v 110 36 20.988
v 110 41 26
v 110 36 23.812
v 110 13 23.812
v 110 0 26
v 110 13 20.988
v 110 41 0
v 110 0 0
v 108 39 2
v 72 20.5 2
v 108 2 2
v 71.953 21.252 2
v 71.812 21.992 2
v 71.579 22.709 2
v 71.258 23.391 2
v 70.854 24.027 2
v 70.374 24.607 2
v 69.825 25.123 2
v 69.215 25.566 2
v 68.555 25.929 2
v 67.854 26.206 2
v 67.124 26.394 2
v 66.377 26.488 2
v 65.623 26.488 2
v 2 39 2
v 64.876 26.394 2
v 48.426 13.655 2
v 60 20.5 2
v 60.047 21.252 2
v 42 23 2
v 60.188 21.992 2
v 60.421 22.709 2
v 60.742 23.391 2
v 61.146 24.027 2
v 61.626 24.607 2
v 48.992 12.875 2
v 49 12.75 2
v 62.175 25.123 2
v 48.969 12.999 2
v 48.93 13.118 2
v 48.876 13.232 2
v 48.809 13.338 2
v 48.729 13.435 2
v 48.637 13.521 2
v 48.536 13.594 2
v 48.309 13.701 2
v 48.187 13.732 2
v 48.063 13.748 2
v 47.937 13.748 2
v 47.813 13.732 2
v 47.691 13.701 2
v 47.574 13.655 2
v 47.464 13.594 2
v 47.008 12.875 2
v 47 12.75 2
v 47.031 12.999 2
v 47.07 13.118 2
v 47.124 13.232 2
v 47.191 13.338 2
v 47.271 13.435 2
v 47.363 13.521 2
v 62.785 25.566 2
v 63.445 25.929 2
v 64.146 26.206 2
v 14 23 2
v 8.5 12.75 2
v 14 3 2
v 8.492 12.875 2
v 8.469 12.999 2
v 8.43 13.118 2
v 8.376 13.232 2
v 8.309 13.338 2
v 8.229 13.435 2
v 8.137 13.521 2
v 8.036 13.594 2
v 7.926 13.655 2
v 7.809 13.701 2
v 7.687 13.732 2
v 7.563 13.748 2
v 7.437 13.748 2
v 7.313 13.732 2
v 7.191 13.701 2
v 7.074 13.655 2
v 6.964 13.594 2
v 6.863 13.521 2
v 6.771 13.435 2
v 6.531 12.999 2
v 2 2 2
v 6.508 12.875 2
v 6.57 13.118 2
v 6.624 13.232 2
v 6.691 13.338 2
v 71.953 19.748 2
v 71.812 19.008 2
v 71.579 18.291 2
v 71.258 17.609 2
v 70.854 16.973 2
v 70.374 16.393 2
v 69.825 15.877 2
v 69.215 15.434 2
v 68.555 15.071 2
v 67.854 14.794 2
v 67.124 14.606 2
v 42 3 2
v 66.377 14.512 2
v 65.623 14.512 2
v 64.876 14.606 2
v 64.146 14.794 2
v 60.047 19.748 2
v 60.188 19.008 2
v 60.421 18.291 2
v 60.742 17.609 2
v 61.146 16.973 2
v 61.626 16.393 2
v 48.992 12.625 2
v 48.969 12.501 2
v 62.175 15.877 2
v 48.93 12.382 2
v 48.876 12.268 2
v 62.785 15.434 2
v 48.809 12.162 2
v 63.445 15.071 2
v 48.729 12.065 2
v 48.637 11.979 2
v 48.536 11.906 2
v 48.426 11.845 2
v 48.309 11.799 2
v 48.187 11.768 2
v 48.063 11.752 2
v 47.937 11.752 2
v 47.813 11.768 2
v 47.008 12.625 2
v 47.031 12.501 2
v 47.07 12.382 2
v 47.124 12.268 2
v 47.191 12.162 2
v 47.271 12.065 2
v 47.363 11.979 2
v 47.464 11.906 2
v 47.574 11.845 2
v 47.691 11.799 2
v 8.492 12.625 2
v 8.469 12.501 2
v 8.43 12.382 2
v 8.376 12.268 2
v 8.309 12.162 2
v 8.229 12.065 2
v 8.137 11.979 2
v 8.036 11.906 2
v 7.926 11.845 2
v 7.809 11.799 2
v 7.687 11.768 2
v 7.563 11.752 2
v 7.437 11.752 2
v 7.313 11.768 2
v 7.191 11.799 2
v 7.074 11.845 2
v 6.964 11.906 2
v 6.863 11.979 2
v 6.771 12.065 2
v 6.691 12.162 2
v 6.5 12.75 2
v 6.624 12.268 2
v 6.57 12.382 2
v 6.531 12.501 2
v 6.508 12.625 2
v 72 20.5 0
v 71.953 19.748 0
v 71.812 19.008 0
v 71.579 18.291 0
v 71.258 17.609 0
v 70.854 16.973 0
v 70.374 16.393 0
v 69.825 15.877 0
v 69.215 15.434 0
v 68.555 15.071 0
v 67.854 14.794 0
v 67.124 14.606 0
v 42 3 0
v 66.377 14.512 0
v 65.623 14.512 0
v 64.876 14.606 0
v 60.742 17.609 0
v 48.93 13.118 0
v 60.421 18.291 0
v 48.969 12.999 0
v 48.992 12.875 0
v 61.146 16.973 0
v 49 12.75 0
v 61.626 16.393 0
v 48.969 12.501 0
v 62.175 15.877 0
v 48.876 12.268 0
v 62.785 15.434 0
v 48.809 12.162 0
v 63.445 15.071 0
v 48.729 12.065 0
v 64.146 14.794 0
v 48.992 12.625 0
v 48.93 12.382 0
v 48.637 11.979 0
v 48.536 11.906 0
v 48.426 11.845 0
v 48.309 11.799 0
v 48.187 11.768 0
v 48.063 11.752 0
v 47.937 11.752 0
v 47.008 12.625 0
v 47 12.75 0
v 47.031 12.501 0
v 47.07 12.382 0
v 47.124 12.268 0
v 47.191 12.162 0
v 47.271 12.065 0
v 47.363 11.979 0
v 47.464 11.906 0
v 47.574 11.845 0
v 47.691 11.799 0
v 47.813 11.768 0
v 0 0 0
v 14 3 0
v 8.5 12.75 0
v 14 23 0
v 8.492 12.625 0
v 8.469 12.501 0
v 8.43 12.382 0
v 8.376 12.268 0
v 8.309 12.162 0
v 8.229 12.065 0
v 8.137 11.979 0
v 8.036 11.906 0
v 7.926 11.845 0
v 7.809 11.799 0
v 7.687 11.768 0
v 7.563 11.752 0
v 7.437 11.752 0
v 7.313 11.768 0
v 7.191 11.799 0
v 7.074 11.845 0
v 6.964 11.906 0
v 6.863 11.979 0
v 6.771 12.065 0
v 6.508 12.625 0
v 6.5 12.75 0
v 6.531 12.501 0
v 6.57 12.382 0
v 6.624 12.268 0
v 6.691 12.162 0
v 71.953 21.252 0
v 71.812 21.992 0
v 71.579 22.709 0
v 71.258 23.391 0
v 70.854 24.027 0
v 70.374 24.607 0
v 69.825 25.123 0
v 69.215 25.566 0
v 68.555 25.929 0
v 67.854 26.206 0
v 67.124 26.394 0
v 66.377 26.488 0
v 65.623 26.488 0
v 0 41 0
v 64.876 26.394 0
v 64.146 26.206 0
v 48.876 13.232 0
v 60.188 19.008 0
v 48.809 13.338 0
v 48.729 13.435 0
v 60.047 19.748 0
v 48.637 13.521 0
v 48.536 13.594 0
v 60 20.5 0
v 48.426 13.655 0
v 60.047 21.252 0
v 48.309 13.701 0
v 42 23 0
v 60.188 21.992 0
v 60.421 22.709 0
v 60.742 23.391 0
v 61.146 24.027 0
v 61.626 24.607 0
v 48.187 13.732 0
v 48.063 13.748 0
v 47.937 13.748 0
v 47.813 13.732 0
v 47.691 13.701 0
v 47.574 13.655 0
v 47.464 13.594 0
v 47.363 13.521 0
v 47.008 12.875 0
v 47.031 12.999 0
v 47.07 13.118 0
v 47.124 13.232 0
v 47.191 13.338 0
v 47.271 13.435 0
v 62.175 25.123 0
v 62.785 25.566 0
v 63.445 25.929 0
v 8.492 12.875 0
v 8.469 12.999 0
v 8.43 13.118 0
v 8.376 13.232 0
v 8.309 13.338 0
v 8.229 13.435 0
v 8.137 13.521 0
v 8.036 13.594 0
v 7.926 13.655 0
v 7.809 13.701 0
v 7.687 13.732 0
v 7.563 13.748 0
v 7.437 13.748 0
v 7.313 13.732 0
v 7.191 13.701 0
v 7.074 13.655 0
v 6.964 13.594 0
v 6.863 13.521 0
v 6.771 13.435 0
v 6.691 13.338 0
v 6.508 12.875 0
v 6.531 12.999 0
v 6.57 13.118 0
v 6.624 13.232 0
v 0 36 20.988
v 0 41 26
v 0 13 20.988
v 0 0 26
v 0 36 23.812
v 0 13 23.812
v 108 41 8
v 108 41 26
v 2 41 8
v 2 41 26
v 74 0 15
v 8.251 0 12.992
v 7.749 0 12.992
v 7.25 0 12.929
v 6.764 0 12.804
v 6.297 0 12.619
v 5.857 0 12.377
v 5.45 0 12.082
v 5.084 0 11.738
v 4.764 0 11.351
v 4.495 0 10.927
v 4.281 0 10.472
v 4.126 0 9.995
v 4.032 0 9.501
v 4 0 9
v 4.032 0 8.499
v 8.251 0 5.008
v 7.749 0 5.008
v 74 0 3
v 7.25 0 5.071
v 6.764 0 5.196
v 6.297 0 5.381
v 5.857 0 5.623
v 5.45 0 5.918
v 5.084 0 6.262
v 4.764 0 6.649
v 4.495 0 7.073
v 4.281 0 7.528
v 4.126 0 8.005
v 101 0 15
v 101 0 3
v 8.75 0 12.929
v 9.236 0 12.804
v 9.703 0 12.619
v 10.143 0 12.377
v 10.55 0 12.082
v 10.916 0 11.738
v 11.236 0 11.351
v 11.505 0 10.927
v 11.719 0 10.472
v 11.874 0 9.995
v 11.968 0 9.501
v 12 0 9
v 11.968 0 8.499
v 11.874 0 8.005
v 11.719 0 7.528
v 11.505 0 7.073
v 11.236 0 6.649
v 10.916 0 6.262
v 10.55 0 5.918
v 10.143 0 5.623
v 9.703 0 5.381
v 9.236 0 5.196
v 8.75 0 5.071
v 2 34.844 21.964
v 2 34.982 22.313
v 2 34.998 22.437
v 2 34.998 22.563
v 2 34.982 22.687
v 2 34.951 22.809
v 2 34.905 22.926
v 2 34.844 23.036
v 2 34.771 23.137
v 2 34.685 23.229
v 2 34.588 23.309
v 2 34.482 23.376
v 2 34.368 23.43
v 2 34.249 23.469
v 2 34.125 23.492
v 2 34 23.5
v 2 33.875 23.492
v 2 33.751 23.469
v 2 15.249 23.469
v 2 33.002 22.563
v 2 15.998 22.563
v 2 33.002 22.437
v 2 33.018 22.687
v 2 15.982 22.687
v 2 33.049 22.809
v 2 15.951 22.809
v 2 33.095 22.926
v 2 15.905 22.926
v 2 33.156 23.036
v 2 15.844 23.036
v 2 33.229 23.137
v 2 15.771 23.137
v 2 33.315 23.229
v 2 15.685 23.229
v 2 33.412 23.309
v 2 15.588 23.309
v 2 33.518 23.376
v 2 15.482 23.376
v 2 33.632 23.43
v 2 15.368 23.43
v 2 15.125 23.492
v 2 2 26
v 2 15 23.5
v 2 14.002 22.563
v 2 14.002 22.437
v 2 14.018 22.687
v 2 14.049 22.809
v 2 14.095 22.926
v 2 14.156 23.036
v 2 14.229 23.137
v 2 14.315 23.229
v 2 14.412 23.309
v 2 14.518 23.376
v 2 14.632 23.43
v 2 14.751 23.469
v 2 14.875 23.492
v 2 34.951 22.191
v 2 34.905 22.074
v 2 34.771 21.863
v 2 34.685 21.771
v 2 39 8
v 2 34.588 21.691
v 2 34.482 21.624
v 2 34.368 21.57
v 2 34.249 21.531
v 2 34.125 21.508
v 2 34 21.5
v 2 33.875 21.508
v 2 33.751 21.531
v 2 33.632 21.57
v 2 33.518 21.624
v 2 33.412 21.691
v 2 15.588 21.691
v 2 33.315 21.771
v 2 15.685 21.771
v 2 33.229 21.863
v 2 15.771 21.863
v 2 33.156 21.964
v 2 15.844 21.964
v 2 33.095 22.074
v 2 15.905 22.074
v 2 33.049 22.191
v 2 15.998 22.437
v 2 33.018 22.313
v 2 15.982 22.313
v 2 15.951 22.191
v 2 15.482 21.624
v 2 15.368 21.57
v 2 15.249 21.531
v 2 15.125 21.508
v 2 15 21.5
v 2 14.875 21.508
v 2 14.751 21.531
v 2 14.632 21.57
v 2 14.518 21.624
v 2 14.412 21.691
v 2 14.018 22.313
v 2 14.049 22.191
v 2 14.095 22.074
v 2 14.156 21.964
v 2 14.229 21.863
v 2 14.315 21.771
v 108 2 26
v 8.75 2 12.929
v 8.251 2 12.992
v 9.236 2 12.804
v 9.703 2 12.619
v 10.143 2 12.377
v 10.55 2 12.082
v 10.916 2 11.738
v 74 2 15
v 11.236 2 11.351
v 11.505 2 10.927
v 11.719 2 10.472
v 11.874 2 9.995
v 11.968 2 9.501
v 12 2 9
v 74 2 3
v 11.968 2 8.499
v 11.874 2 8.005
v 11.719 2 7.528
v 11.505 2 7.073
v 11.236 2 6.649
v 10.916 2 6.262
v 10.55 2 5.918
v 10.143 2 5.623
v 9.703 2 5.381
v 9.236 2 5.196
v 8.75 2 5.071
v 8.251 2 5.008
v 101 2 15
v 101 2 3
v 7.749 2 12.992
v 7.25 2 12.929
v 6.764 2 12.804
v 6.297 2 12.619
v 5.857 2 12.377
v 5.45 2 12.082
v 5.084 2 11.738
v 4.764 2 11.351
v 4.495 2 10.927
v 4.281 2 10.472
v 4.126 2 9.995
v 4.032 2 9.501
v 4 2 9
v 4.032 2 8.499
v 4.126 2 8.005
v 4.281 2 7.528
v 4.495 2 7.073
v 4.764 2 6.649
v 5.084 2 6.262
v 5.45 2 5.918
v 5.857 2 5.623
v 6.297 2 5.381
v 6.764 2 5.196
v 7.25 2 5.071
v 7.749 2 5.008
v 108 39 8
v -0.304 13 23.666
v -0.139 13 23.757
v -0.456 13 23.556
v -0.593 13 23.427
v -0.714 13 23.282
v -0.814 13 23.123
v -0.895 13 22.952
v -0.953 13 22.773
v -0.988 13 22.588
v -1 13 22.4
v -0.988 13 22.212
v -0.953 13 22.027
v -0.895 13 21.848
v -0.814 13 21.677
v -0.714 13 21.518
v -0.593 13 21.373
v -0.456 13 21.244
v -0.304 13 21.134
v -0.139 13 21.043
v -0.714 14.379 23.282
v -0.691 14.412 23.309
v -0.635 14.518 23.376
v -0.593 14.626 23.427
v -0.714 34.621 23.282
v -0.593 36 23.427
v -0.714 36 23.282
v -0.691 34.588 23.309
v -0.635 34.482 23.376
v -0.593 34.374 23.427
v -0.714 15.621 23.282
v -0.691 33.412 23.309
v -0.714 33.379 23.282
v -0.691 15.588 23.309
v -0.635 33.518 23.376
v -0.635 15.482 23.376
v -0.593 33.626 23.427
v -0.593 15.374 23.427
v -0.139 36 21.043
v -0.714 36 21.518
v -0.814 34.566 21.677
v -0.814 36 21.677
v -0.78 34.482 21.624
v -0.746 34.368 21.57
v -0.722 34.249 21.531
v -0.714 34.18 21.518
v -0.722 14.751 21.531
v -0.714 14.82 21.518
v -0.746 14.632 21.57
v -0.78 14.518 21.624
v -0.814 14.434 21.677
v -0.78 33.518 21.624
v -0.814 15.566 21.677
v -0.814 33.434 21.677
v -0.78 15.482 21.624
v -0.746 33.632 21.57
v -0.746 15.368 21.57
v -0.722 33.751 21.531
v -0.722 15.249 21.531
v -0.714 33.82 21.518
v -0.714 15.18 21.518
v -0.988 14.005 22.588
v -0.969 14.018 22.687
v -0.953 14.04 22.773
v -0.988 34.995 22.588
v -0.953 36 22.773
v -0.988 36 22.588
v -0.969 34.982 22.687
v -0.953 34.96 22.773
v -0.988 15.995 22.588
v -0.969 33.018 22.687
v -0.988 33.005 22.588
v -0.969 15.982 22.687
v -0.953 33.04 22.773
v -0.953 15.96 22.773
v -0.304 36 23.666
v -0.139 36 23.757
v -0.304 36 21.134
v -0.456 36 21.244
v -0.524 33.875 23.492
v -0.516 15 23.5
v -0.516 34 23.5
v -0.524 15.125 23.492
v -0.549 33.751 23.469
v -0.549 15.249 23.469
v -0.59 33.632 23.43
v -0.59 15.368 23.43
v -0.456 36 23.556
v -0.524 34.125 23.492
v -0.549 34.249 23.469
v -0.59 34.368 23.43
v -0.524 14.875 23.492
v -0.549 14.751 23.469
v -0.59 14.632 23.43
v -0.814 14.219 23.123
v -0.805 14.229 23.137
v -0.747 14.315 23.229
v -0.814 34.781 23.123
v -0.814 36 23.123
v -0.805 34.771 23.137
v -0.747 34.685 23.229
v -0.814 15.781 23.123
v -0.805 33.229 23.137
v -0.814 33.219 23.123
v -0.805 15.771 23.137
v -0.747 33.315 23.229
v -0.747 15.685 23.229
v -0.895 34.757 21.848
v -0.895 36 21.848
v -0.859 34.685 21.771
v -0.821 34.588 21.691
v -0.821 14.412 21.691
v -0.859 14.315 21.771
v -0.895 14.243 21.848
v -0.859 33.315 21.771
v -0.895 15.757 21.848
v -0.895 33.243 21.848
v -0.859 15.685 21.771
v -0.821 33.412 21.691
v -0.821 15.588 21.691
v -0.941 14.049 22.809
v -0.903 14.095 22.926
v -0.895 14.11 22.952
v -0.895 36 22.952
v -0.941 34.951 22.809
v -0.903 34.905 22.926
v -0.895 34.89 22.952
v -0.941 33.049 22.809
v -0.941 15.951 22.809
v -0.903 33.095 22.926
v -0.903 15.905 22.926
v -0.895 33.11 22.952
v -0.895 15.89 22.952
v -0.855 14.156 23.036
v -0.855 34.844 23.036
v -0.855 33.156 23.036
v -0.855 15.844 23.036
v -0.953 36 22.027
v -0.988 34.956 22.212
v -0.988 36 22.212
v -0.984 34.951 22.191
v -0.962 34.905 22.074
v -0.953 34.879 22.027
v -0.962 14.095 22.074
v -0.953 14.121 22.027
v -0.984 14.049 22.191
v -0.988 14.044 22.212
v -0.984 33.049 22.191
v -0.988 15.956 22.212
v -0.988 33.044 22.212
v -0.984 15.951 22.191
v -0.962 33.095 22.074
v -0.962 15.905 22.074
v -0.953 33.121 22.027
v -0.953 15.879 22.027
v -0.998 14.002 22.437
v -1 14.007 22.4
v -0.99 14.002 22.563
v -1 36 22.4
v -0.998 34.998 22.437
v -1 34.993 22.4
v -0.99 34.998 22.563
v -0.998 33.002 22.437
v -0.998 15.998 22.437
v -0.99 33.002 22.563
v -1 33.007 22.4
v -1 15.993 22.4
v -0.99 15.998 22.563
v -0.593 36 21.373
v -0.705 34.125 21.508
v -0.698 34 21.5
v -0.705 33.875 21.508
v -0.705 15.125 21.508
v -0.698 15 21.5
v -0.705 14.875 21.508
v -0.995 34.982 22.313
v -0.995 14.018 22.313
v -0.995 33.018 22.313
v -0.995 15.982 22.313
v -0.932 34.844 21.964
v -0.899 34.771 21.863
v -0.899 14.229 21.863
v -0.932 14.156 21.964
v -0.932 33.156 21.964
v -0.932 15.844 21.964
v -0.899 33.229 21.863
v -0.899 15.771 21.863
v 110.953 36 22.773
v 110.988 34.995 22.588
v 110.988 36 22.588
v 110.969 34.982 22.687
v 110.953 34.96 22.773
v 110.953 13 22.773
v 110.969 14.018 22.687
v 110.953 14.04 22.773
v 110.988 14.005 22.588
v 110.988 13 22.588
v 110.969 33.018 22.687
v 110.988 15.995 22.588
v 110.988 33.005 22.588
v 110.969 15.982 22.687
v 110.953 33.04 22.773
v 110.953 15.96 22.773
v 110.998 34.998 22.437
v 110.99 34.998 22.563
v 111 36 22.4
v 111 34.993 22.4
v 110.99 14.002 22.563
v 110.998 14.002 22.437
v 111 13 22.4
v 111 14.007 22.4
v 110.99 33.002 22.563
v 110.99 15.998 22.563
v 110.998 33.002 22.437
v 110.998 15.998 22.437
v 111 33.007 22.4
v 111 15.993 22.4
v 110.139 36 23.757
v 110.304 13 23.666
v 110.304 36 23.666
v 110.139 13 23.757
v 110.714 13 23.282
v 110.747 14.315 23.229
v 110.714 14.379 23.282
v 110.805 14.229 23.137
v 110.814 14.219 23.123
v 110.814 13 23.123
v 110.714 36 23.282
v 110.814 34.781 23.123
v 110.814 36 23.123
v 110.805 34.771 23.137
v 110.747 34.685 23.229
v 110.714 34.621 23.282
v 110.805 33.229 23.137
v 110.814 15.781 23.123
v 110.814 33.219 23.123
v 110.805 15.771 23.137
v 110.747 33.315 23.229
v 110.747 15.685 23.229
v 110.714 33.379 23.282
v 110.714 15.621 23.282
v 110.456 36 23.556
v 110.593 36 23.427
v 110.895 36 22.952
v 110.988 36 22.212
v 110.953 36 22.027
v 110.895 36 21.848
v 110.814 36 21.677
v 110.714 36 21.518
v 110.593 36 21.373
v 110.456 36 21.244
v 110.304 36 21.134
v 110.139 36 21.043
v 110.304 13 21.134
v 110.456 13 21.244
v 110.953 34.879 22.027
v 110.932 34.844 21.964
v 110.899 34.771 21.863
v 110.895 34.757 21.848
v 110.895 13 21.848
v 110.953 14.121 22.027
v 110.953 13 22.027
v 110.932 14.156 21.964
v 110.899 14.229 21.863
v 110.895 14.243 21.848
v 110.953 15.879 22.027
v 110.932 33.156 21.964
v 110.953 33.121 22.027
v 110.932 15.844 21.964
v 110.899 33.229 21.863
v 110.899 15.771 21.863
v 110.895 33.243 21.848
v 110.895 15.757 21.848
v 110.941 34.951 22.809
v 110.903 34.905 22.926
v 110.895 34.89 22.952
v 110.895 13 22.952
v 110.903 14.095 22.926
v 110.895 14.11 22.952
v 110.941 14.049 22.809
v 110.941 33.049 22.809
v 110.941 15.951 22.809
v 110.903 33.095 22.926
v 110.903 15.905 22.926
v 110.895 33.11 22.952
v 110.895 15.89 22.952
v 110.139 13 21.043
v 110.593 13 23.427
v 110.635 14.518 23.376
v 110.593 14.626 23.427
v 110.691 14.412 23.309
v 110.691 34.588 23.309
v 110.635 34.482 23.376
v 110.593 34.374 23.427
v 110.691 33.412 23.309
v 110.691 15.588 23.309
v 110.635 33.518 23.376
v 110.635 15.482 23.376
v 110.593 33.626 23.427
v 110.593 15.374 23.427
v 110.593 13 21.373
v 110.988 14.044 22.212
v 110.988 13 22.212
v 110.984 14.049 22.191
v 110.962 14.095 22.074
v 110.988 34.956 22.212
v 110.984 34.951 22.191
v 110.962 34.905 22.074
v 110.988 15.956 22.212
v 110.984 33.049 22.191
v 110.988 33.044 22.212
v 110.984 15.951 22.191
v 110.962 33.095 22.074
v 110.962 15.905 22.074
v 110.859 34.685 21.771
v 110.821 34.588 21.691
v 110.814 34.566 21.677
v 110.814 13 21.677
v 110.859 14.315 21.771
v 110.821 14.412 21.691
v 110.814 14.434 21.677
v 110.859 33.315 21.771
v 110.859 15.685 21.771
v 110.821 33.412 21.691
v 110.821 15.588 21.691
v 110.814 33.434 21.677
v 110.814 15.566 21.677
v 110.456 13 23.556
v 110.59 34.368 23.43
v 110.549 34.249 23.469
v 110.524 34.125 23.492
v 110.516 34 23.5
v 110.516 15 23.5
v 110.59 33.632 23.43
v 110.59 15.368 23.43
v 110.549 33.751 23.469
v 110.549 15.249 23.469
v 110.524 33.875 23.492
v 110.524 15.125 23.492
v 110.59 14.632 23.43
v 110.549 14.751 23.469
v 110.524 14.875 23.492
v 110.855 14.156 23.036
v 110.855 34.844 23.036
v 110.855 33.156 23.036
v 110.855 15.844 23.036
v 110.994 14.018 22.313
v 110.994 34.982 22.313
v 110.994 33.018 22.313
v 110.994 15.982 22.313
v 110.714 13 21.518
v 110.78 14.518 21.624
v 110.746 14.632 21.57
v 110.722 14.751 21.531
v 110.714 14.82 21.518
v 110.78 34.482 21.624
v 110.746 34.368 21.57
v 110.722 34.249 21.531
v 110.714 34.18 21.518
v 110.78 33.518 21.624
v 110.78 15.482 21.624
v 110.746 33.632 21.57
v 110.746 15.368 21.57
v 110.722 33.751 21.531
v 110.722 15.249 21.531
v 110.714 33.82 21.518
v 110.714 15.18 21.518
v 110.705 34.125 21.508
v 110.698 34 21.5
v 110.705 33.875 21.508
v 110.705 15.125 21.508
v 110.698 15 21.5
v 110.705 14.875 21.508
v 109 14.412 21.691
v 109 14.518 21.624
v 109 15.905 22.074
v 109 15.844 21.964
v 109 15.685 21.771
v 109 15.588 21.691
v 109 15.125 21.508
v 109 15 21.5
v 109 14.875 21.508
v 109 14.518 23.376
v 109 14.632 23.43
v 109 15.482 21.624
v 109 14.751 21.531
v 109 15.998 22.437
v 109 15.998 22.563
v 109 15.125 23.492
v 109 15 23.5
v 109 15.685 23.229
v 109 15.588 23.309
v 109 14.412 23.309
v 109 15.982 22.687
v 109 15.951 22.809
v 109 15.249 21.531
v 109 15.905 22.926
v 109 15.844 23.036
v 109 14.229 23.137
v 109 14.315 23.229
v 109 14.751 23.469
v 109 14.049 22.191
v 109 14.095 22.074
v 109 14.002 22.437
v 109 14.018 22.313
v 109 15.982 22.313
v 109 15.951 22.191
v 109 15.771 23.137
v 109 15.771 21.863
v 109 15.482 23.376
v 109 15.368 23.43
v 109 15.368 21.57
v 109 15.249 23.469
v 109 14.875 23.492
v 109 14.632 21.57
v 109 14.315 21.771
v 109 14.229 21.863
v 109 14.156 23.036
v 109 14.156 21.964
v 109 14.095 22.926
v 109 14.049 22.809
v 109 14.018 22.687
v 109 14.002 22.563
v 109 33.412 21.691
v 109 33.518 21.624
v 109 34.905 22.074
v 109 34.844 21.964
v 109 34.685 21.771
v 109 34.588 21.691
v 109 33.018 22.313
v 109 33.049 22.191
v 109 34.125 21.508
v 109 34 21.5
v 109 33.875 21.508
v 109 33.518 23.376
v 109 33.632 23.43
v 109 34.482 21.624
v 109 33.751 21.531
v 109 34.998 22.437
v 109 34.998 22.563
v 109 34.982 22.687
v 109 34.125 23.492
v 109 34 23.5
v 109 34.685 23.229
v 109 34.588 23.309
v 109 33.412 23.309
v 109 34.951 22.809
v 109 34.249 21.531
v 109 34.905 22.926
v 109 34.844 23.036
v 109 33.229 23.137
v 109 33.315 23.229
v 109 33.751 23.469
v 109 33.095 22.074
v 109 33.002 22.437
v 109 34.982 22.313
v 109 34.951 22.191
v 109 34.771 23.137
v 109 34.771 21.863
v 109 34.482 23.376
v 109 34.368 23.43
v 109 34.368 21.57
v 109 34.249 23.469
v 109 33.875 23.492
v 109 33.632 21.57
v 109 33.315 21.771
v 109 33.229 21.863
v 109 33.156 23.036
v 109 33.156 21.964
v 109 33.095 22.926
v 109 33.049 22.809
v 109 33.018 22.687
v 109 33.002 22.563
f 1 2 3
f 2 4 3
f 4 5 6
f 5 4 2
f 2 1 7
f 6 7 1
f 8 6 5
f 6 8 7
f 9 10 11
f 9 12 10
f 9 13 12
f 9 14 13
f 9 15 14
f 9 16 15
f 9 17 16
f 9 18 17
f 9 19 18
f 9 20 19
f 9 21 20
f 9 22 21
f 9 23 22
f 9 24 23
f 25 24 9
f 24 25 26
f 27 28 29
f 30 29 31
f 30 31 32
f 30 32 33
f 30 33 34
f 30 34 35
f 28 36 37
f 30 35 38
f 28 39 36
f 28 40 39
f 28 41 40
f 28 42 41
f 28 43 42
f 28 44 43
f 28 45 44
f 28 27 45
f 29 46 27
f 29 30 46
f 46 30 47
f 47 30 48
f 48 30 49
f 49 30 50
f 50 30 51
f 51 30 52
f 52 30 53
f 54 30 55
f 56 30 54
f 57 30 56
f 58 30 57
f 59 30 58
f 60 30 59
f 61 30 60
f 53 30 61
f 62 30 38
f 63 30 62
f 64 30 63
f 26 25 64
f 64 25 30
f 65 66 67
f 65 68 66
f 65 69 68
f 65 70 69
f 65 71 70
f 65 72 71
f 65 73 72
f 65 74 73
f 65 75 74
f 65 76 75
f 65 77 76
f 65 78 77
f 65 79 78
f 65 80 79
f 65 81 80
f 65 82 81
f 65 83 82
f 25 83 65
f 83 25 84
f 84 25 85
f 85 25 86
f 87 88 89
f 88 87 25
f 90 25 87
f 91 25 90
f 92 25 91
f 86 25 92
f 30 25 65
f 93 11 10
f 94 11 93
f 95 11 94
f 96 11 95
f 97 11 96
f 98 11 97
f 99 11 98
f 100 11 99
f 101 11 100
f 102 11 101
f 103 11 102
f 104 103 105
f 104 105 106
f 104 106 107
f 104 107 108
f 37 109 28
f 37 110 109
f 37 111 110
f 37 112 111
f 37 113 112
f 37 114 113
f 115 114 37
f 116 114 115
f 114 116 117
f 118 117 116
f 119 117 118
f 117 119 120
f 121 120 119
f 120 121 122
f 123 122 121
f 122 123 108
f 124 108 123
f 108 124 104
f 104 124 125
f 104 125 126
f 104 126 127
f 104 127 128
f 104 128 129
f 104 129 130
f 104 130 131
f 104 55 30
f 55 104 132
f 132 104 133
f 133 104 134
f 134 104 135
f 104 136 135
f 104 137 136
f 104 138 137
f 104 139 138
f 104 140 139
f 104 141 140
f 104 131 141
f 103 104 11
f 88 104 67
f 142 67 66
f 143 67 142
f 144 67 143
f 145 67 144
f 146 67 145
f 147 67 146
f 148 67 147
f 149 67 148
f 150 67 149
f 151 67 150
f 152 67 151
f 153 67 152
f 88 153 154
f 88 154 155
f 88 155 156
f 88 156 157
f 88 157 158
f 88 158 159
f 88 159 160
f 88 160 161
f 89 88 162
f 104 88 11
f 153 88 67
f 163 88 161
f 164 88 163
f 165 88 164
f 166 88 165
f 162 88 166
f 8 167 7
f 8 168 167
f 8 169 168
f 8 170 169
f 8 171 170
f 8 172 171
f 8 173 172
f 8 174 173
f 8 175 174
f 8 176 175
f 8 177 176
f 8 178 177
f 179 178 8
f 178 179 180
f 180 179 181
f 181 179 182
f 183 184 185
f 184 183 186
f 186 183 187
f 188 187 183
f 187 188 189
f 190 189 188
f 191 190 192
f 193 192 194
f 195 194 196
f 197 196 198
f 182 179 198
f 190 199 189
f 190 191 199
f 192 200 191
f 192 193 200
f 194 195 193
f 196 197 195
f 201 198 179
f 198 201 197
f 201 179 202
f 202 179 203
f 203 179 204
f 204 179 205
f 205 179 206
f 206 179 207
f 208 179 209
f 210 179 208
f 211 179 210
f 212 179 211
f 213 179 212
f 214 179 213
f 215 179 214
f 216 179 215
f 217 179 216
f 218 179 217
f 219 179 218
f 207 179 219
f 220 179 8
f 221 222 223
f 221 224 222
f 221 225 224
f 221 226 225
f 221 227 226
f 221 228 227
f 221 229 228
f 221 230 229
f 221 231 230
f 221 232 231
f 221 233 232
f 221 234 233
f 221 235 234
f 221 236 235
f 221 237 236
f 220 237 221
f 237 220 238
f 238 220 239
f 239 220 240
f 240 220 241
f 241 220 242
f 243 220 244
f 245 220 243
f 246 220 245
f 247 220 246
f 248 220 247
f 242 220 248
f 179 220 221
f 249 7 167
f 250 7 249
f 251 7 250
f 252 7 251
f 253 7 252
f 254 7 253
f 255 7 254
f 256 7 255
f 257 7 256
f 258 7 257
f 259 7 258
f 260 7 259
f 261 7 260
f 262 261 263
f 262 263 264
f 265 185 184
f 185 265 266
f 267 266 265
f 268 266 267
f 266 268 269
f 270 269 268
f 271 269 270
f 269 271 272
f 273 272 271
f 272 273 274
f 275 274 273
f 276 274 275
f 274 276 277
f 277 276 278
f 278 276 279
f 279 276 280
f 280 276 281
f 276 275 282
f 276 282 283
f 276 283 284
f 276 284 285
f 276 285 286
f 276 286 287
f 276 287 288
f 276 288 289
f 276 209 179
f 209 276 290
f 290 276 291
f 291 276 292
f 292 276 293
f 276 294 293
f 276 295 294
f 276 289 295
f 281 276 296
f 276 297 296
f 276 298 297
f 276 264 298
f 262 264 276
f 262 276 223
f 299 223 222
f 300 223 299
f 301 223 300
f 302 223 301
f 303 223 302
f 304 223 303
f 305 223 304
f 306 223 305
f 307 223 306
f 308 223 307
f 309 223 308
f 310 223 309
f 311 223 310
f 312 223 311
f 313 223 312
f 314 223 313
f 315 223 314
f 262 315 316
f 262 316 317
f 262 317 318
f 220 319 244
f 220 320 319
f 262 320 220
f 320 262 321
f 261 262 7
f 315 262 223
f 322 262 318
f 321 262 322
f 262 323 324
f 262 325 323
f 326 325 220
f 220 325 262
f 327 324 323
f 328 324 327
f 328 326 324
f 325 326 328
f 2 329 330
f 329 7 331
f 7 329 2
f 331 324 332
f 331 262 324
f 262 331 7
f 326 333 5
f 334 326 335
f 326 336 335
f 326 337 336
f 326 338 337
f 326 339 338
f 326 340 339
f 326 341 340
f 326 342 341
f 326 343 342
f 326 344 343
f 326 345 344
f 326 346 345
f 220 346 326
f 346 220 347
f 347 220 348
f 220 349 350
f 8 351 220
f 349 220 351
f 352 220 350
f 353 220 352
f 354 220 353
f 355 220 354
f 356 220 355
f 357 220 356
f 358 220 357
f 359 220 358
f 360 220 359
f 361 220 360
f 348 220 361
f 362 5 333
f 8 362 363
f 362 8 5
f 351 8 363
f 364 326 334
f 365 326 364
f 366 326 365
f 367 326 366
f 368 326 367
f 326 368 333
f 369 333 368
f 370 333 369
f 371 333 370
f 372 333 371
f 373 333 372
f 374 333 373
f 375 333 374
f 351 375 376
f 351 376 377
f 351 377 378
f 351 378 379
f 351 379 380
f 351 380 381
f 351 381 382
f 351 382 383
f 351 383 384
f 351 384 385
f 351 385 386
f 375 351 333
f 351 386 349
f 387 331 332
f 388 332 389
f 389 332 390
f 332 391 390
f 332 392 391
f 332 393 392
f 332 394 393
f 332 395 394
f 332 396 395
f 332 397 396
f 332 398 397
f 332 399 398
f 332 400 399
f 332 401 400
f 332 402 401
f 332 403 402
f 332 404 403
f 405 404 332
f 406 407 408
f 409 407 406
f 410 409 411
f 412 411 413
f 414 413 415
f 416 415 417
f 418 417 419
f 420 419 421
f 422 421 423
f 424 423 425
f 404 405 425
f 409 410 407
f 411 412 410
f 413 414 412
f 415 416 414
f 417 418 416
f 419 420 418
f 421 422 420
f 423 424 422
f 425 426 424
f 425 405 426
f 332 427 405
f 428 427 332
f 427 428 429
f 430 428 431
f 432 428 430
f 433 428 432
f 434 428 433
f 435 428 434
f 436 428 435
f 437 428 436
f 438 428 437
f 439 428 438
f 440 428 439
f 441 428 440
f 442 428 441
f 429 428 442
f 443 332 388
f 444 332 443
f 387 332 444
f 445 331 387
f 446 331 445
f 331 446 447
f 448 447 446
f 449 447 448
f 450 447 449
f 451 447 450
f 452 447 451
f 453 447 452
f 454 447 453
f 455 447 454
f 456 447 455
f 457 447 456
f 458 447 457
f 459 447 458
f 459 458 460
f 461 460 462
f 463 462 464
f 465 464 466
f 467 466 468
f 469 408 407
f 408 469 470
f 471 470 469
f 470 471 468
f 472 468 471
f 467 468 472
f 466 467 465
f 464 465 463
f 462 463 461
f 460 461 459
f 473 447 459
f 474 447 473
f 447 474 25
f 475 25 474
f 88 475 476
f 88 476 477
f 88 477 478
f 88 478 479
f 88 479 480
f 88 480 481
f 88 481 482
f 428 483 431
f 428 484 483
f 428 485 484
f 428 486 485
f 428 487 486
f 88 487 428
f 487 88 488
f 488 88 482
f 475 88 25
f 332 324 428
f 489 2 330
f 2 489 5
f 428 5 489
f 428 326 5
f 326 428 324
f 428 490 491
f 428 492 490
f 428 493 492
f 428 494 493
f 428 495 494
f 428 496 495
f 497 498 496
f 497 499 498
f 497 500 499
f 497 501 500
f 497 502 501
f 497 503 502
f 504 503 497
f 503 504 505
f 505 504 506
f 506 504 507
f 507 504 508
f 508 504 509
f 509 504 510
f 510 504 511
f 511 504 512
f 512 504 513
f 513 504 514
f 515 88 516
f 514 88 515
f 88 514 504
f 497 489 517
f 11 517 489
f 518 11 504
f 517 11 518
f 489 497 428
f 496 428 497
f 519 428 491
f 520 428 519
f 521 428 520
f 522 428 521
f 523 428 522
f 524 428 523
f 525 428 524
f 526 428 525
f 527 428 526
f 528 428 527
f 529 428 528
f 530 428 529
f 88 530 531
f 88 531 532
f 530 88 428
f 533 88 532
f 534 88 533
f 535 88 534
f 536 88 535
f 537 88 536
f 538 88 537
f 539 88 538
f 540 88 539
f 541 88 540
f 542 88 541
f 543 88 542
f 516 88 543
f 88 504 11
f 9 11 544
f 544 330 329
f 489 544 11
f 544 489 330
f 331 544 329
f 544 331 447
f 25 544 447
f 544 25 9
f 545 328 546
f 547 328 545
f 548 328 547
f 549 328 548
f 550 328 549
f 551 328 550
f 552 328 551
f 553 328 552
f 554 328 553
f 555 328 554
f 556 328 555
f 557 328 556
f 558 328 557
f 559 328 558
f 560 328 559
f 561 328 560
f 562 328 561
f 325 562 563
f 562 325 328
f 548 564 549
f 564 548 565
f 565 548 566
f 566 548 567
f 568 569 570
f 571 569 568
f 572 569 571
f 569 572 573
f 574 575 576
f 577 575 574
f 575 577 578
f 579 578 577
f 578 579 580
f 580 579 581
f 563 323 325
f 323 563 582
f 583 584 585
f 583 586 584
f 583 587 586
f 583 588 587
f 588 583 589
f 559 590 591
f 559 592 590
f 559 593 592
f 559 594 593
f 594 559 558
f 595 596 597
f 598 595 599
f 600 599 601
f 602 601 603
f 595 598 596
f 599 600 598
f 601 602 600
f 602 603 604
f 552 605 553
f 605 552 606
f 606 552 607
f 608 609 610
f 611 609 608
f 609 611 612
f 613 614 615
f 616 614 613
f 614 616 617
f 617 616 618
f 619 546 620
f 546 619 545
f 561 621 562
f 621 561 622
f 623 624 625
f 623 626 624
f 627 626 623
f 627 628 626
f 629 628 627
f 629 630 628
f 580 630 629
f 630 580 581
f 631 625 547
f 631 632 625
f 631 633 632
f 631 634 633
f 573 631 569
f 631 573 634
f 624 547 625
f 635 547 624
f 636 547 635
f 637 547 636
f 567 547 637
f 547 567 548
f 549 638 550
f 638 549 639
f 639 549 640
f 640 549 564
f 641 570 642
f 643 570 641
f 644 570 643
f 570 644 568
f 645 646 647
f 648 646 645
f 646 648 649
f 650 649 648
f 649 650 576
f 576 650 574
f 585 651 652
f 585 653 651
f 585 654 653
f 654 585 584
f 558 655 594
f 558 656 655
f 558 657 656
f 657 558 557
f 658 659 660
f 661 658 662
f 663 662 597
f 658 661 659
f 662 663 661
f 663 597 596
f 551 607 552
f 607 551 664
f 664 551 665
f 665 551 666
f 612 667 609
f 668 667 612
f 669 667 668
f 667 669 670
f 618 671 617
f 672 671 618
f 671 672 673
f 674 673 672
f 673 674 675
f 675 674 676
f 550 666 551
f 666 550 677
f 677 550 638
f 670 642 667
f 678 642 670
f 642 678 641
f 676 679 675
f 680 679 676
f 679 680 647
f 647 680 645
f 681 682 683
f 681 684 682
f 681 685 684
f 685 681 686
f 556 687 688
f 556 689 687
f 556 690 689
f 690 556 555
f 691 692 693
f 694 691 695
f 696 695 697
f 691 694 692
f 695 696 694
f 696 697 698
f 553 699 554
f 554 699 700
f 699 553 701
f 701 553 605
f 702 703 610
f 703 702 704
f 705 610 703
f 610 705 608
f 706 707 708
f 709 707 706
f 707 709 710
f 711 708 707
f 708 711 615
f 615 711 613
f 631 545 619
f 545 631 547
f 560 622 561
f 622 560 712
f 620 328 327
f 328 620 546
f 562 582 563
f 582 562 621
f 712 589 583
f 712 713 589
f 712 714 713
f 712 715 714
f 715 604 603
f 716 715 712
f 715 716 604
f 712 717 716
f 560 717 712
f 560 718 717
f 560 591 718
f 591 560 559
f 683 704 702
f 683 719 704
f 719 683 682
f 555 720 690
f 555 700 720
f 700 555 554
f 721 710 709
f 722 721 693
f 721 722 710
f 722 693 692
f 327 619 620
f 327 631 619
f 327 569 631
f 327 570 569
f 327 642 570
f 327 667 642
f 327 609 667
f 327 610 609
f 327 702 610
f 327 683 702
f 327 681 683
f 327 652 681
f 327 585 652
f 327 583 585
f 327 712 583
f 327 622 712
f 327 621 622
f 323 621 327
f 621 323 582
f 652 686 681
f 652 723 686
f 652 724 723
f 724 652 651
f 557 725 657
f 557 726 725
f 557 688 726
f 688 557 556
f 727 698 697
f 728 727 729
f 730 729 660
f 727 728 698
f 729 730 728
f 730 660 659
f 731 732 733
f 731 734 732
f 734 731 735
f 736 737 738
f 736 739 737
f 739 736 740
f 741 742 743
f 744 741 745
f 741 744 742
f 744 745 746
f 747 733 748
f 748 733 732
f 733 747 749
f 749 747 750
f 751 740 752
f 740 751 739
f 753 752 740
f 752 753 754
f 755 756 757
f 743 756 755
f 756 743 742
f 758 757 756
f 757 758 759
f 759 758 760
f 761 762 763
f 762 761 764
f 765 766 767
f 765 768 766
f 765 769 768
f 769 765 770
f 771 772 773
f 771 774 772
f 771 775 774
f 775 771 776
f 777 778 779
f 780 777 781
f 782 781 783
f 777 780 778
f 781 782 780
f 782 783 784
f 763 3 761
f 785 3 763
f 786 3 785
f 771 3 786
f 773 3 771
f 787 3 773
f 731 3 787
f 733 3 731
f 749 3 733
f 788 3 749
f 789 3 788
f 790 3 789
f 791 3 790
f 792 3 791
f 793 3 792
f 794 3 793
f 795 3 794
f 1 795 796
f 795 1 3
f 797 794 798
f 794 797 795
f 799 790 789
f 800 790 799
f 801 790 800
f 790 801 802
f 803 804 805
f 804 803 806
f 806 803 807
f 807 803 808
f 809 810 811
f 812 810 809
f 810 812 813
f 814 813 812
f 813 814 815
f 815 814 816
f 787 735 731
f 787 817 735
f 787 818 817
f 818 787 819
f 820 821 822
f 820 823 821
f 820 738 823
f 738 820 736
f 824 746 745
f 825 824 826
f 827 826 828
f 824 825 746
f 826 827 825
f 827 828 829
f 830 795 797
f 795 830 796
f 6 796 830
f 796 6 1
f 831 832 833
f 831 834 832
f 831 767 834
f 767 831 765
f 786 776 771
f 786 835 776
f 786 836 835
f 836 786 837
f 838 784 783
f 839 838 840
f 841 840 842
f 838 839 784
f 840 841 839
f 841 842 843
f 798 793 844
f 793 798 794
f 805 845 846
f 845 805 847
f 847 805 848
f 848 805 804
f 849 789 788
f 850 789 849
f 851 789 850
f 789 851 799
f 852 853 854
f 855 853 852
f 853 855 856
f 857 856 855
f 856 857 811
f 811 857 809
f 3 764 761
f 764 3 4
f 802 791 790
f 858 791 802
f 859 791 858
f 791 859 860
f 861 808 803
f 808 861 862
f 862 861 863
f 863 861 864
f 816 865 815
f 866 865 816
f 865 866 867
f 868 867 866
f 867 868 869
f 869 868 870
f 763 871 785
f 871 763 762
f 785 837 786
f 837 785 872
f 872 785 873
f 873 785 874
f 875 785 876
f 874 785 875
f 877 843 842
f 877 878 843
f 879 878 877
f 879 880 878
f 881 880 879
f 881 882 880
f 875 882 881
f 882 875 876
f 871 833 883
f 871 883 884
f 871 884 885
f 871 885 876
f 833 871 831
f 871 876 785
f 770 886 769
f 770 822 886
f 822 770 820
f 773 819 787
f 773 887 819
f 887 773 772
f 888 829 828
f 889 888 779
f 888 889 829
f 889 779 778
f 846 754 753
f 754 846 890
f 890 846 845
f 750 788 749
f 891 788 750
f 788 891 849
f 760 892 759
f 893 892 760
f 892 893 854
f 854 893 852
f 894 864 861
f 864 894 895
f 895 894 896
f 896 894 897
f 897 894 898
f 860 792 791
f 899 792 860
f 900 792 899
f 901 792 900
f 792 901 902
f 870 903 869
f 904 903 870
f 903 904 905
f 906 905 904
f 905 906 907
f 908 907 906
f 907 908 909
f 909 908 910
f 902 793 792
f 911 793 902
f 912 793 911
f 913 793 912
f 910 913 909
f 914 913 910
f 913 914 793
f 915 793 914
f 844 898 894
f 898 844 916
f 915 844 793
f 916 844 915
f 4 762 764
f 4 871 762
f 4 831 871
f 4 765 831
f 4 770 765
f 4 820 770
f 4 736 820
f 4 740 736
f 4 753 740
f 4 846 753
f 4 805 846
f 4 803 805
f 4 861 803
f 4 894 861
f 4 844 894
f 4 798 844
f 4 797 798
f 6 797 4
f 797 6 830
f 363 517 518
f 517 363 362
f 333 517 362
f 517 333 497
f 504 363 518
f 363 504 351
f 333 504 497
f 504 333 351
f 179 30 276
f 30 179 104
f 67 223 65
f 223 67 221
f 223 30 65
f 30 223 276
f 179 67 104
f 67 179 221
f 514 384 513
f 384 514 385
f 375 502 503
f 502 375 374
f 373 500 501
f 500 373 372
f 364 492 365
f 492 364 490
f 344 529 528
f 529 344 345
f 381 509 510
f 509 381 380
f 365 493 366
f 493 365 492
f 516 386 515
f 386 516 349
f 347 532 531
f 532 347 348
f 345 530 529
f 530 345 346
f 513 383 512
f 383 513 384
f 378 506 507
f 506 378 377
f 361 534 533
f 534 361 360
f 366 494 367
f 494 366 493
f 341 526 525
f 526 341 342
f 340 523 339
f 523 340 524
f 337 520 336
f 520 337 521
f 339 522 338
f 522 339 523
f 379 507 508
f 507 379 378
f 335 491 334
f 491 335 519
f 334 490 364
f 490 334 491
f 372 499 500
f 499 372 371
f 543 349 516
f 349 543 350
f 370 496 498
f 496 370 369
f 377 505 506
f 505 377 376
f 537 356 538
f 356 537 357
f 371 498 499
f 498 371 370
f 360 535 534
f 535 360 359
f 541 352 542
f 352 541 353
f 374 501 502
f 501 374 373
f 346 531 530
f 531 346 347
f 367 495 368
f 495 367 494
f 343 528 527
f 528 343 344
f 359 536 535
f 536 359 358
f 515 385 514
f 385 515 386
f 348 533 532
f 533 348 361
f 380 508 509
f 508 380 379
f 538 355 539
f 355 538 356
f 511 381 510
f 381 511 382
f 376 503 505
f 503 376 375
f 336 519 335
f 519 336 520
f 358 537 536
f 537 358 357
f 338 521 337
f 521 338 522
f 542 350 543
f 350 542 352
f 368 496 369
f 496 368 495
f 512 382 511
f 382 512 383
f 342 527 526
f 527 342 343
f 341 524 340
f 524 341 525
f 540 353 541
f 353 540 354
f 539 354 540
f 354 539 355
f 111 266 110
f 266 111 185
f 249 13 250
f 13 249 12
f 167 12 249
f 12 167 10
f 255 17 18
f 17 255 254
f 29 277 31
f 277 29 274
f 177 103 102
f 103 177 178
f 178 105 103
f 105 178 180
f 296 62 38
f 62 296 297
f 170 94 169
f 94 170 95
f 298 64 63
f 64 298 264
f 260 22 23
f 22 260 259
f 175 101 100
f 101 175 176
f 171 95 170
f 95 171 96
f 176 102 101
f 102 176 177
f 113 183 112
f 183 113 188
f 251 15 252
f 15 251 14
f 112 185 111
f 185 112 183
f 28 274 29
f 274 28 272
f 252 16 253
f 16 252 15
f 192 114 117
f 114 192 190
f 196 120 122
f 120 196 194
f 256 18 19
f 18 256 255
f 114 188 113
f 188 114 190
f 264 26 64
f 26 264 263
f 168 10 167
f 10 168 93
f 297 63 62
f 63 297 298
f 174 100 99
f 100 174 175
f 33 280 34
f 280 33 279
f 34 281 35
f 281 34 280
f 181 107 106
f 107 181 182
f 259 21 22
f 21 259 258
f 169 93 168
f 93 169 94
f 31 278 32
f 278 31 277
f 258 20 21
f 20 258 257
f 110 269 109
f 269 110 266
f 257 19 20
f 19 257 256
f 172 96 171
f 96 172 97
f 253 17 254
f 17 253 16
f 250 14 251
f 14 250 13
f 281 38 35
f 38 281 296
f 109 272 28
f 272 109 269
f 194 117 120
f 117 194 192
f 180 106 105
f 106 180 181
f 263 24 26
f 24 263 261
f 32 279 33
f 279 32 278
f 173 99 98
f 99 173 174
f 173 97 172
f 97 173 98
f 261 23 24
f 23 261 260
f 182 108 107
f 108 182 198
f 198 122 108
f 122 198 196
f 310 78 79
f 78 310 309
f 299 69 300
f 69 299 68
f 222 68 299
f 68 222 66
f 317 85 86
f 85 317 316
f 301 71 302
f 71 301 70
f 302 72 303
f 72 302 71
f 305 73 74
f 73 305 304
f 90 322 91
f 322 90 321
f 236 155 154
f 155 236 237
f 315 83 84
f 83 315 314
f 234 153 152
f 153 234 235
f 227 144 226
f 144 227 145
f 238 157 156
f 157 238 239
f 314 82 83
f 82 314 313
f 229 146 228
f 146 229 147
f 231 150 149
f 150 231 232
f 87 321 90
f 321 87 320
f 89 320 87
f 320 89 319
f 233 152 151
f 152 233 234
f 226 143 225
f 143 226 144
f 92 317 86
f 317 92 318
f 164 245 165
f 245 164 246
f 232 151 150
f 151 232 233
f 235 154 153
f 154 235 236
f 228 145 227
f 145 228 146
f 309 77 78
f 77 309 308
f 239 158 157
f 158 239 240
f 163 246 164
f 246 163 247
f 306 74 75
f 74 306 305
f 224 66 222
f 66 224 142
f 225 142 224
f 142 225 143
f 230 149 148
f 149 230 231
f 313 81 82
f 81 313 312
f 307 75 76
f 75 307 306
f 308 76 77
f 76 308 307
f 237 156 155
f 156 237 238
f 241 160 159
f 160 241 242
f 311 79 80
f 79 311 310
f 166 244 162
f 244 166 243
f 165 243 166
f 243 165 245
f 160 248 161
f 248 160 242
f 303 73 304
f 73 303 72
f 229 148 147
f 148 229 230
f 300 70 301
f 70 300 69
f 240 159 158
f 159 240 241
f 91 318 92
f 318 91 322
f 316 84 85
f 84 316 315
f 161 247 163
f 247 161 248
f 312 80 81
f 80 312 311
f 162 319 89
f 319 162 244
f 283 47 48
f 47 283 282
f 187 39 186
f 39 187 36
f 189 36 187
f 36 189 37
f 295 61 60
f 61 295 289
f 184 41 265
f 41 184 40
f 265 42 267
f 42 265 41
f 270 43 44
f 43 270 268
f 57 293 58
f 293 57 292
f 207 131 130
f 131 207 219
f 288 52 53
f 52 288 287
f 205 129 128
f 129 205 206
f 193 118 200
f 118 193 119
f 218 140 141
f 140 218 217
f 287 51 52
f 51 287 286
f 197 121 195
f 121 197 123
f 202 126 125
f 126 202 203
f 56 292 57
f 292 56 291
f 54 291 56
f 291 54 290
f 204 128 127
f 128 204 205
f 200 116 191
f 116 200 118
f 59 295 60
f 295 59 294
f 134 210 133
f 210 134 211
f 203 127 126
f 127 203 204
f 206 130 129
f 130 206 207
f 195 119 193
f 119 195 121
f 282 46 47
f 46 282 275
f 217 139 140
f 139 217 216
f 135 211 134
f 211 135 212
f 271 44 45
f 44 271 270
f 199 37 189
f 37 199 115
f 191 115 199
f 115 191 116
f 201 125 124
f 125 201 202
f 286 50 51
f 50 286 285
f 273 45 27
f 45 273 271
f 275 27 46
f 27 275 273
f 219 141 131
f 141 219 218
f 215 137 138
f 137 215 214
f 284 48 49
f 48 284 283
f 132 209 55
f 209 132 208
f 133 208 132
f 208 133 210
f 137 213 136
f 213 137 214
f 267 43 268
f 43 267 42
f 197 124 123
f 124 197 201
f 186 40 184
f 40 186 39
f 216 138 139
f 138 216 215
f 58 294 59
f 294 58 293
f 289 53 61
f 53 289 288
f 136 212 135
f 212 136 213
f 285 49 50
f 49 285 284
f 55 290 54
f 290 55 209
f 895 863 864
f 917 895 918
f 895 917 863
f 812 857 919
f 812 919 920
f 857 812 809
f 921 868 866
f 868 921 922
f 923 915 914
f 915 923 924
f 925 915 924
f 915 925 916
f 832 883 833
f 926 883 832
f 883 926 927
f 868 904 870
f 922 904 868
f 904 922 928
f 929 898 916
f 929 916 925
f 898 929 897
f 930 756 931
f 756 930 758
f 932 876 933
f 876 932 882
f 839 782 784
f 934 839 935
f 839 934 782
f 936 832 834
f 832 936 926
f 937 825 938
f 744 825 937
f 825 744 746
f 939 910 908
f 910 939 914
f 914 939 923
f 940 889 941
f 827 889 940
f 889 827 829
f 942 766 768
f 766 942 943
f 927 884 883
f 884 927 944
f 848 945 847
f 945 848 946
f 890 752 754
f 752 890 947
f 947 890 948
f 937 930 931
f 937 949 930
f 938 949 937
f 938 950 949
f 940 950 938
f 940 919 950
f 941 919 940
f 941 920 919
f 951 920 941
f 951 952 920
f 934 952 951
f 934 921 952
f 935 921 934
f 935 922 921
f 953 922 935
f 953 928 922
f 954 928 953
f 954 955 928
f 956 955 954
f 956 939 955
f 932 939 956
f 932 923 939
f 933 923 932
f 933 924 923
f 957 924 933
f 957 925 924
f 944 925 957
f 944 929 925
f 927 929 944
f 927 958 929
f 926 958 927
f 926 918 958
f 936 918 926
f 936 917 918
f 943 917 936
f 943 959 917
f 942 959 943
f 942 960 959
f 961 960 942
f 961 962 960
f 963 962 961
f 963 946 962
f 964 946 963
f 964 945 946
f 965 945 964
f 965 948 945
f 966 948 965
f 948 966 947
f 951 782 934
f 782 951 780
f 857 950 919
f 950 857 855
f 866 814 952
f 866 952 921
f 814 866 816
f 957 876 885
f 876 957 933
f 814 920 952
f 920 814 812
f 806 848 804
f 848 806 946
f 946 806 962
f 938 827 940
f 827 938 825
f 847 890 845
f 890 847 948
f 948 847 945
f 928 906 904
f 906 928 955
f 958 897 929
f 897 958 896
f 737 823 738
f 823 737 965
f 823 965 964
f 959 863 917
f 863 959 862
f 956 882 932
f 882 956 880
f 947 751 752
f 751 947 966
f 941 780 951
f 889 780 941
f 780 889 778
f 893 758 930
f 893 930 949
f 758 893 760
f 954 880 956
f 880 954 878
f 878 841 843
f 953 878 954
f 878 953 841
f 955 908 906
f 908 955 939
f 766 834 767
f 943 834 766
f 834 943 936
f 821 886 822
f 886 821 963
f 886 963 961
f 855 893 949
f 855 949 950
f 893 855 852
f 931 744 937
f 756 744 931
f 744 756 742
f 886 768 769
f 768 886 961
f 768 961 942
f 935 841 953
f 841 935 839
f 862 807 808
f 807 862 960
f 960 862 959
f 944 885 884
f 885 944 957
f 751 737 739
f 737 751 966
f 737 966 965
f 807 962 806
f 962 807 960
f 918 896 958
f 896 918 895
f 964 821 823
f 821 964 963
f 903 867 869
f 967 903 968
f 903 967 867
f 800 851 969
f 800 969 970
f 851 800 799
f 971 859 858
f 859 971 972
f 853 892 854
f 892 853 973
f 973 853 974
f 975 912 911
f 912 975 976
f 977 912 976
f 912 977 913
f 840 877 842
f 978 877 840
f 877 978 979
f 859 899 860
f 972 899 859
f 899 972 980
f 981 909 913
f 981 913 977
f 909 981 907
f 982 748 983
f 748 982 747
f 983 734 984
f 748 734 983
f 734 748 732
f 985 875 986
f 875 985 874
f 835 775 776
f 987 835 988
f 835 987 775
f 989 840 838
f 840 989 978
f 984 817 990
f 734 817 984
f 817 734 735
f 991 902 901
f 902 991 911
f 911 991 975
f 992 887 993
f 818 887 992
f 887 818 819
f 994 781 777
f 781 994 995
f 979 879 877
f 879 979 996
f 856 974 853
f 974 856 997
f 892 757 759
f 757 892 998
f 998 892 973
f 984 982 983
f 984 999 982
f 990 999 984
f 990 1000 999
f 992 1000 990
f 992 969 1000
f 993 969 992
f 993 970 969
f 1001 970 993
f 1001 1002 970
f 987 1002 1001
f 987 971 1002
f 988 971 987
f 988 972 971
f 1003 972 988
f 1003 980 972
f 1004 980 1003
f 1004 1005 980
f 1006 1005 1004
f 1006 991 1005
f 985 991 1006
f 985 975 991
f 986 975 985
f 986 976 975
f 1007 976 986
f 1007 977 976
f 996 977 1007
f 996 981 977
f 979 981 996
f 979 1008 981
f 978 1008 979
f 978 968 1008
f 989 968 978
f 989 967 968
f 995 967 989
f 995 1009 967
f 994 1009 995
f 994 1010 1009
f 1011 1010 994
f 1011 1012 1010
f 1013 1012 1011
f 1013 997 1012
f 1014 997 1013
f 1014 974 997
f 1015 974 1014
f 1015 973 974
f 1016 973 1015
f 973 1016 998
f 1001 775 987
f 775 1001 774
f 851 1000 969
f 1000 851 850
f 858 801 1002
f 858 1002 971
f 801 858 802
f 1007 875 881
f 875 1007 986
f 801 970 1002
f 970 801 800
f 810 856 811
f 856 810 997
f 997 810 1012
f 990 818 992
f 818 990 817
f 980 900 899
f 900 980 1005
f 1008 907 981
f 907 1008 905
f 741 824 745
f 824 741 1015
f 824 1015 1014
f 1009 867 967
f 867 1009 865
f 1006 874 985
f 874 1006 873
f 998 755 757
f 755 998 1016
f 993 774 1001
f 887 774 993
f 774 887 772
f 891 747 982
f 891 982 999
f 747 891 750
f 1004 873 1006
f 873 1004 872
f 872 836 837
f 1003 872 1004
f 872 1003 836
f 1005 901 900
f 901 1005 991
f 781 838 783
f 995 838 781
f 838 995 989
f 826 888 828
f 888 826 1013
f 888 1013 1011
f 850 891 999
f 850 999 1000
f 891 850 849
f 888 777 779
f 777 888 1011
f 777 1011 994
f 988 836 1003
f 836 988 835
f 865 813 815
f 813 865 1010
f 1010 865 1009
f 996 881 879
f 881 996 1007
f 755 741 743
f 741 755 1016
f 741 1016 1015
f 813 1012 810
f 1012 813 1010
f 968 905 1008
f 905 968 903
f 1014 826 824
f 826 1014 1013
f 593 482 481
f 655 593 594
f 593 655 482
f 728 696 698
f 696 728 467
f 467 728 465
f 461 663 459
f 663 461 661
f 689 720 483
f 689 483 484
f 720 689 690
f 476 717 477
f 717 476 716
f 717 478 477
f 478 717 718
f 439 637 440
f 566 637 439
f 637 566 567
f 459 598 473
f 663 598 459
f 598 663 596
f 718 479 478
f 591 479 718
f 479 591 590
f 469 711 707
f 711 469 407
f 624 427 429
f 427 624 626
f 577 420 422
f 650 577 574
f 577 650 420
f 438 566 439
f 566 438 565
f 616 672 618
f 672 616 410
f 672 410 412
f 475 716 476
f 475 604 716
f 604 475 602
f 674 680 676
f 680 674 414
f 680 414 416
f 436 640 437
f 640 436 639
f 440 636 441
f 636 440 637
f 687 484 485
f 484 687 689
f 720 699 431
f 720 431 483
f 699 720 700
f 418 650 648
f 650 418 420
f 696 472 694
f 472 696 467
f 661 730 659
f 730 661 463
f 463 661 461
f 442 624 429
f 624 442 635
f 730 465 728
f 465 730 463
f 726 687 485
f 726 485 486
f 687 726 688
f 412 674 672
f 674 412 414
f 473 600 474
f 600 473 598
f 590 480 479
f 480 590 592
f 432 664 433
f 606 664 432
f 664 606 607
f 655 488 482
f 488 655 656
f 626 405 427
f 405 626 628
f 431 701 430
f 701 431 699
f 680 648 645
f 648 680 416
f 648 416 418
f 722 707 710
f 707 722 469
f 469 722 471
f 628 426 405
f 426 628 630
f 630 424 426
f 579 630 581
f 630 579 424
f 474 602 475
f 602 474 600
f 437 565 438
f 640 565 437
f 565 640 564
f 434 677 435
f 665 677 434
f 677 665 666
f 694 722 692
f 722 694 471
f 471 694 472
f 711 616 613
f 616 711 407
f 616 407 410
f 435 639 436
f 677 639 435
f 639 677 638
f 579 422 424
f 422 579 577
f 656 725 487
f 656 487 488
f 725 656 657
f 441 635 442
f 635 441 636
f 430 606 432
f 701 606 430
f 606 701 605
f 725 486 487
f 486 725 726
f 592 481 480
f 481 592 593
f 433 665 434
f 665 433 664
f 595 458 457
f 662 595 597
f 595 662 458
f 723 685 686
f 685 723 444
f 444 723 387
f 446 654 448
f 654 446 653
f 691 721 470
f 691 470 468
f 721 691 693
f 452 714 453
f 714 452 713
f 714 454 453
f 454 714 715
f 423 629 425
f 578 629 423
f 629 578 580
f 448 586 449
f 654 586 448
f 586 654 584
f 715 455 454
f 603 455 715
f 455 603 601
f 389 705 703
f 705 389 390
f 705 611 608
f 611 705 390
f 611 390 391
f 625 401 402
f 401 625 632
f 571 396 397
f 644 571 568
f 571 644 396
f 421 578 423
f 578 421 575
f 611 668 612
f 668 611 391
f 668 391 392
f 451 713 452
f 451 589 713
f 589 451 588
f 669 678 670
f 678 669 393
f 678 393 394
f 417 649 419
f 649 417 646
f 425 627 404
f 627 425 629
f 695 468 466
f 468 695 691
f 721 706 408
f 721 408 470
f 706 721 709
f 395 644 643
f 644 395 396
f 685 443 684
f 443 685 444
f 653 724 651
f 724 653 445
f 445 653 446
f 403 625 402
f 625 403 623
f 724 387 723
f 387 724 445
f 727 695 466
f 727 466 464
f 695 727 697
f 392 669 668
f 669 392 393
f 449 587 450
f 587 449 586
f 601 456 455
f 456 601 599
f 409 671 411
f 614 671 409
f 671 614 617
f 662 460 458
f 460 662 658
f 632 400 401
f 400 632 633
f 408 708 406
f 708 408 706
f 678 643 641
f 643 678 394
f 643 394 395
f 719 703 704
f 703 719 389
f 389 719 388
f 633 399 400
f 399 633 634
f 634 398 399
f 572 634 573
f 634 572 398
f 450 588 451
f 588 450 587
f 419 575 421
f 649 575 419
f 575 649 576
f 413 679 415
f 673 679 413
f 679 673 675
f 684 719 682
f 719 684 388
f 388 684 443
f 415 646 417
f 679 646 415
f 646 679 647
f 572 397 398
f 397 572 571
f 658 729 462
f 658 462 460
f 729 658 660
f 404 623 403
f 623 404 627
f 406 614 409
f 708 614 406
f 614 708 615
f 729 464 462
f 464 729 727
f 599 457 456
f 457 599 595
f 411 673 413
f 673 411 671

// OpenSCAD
// [FL_INDEX: keywords="openscad, 3d_parametric, Improved_Ultimate_Power_Supply_Terminal_Cover, csg_solid" | COT="Parametric OpenSCAD design from 3DCodeverse"]
// Title: Improved Ultimate Power Supply Terminal Cover

/*************************************************************************************************
Power Supply Terminal Cover for the power supply commonly used with the Bukobot and other 3d printers
Author: Mike Thompson (thingiverse: mike_linus)
Modified by: Will Winder (thingiverse: Winder)
Date Last Modified: June 1, 2013
Description: simply change the cutout parameters and depth to suit. 
Note: do not change length, height and thickness parameters for the base unless you want to change the core dimensions.
**************************************************************************************************/

//***************************************************************
//don't change these base parameters unless you want to change the core dimensions.
//***************************************************************
/* [Enclosue Size] */
// Long edge of enclosure.

base_length=110;
// Height of enclosure.
base_height=41;

// Deptch of enclosure. Increase this to create more room for your electronics.
base_depth=26;

// Surface thickness of part. 2mm seems to be pretty good.
base_thickness=2;

// Size of hole for cover retaining screws.
mounting_screw_hole_cutout_radius=1;

// Size of hole for power plug screws.
power_screw_hole_cutout_radius=1;

//***************************************************************
//change these cutout parameters to suit you own switch size etc.
//***************************************************************
/* [Cutouts] */
// Square switch cutout - long edge. Set to zero if using a round cutout.
switch_cutout_length=27;
// Square switch cutout - short edge. Set to zero if using a round cutout.
switch_cutout_width=12;

// Round switch cutout radius. Set to zero to use a square cutout. Base depth must be increased depending on the size of your switch.
switch_cutout_radius=0;

// Radius of cutout for LED.
led_cutout_radius=4;
// Radius of cutout for 12v wires.
grommet_cutout_radius=6;

// Square power plug cutout - long edge.
power_plug_cutout_length=28;
// Square power plug cutout - short edge.
power_plug_cutout_width=20;

/* [Hidden] */
hole_resolution=50;
$fn=hole_resolution;

module base(){
union() {
	// 5 sides of the box.
	cube([base_length,base_height,base_thickness]);
	cube([base_thickness,base_height,base_depth]);
	cube([base_length,base_thickness,base_depth]);
	translate([base_length-base_thickness,0,0])cube([base_thickness,base_height,base_depth]);
	// Bottom wall has an 18mm gap at the rear for the terminal area.
	translate([0,base_height-base_thickness,0])cube([base_length,base_thickness,base_depth-18]);

	// (square) Original slot retainers
	//translate([-1,13,base_depth-5])cube([1.5,23,3]);
	//translate([base_length+base_thickness,13,base_depth-5])cube([1.5,23,3]);

	// (cylindrical) New slot retainers.
	translate([0.5,23+13,base_depth-3.6])rotate([90,0,0])
		cylinder(r=1.5, h=23);
	translate([base_length-0.5,23+13,base_depth-3.6])rotate([90,0,0])
		cylinder(r=1.5, h=23);

}
}

safety_margin = base_thickness/2;
difference(){
	base();
	//(square) switch cutout. 9mm away from one side.
	translate([base_length-9-switch_cutout_length,-safety_margin,3])
		cube([switch_cutout_length,base_thickness*2,switch_cutout_width]);

	//(round) switch cutout. Centered 18mm from one side.
	translate([base_length-18, base_thickness+safety_margin, 6+switch_cutout_radius])rotate([90,0,0])
		cylinder(r=switch_cutout_radius, h=base_thickness*2);

	//240v plug cutout. Centered 28mm from one side.
	translate([28-(power_plug_cutout_length/2),3,-safety_margin])
		cube([power_plug_cutout_length,power_plug_cutout_width,base_thickness*2]);

	//led cutout. Centered 8mm from one side.
	translate([8,base_thickness+safety_margin,9])rotate([90,0,0])
		cylinder(r=led_cutout_radius,h=base_thickness*2);

	//12v lead cutout. Shifted 3/5 of the way to one side.
	translate([base_length/5*3,base_height/2,-safety_margin])
		cylinder(r=grommet_cutout_radius,h=base_thickness*2);

	//2x 240v plug screw holes. Hard coded, deal with it!
	translate([7.5,12.75,-safety_margin])
		cylinder(r=power_screw_hole_cutout_radius,h=base_thickness*2);
	translate([48,12.75,-safety_margin])
		cylinder(r=power_screw_hole_cutout_radius,h=base_thickness*2);

	//4x retainer screw holes. 3.5mm away from the top.
	translate([base_length-safety_margin,15,base_depth-3.5])rotate([0,90,0])
		cylinder(r=mounting_screw_hole_cutout_radius,h=base_thickness*3);
	translate([base_length-safety_margin,34,base_depth-3.5])rotate([0,90,0])
		cylinder(r=mounting_screw_hole_cutout_radius,h=base_thickness*3);
	translate([-1-safety_margin,15,base_depth-3.5])rotate([0,90,0])
		cylinder(r=mounting_screw_hole_cutout_radius,h=base_thickness*3);
	translate([-1-safety_margin,34,base_depth-3.5])rotate([0,90,0])
		cylinder(r=mounting_screw_hole_cutout_radius,h=base_thickness*3);
}
